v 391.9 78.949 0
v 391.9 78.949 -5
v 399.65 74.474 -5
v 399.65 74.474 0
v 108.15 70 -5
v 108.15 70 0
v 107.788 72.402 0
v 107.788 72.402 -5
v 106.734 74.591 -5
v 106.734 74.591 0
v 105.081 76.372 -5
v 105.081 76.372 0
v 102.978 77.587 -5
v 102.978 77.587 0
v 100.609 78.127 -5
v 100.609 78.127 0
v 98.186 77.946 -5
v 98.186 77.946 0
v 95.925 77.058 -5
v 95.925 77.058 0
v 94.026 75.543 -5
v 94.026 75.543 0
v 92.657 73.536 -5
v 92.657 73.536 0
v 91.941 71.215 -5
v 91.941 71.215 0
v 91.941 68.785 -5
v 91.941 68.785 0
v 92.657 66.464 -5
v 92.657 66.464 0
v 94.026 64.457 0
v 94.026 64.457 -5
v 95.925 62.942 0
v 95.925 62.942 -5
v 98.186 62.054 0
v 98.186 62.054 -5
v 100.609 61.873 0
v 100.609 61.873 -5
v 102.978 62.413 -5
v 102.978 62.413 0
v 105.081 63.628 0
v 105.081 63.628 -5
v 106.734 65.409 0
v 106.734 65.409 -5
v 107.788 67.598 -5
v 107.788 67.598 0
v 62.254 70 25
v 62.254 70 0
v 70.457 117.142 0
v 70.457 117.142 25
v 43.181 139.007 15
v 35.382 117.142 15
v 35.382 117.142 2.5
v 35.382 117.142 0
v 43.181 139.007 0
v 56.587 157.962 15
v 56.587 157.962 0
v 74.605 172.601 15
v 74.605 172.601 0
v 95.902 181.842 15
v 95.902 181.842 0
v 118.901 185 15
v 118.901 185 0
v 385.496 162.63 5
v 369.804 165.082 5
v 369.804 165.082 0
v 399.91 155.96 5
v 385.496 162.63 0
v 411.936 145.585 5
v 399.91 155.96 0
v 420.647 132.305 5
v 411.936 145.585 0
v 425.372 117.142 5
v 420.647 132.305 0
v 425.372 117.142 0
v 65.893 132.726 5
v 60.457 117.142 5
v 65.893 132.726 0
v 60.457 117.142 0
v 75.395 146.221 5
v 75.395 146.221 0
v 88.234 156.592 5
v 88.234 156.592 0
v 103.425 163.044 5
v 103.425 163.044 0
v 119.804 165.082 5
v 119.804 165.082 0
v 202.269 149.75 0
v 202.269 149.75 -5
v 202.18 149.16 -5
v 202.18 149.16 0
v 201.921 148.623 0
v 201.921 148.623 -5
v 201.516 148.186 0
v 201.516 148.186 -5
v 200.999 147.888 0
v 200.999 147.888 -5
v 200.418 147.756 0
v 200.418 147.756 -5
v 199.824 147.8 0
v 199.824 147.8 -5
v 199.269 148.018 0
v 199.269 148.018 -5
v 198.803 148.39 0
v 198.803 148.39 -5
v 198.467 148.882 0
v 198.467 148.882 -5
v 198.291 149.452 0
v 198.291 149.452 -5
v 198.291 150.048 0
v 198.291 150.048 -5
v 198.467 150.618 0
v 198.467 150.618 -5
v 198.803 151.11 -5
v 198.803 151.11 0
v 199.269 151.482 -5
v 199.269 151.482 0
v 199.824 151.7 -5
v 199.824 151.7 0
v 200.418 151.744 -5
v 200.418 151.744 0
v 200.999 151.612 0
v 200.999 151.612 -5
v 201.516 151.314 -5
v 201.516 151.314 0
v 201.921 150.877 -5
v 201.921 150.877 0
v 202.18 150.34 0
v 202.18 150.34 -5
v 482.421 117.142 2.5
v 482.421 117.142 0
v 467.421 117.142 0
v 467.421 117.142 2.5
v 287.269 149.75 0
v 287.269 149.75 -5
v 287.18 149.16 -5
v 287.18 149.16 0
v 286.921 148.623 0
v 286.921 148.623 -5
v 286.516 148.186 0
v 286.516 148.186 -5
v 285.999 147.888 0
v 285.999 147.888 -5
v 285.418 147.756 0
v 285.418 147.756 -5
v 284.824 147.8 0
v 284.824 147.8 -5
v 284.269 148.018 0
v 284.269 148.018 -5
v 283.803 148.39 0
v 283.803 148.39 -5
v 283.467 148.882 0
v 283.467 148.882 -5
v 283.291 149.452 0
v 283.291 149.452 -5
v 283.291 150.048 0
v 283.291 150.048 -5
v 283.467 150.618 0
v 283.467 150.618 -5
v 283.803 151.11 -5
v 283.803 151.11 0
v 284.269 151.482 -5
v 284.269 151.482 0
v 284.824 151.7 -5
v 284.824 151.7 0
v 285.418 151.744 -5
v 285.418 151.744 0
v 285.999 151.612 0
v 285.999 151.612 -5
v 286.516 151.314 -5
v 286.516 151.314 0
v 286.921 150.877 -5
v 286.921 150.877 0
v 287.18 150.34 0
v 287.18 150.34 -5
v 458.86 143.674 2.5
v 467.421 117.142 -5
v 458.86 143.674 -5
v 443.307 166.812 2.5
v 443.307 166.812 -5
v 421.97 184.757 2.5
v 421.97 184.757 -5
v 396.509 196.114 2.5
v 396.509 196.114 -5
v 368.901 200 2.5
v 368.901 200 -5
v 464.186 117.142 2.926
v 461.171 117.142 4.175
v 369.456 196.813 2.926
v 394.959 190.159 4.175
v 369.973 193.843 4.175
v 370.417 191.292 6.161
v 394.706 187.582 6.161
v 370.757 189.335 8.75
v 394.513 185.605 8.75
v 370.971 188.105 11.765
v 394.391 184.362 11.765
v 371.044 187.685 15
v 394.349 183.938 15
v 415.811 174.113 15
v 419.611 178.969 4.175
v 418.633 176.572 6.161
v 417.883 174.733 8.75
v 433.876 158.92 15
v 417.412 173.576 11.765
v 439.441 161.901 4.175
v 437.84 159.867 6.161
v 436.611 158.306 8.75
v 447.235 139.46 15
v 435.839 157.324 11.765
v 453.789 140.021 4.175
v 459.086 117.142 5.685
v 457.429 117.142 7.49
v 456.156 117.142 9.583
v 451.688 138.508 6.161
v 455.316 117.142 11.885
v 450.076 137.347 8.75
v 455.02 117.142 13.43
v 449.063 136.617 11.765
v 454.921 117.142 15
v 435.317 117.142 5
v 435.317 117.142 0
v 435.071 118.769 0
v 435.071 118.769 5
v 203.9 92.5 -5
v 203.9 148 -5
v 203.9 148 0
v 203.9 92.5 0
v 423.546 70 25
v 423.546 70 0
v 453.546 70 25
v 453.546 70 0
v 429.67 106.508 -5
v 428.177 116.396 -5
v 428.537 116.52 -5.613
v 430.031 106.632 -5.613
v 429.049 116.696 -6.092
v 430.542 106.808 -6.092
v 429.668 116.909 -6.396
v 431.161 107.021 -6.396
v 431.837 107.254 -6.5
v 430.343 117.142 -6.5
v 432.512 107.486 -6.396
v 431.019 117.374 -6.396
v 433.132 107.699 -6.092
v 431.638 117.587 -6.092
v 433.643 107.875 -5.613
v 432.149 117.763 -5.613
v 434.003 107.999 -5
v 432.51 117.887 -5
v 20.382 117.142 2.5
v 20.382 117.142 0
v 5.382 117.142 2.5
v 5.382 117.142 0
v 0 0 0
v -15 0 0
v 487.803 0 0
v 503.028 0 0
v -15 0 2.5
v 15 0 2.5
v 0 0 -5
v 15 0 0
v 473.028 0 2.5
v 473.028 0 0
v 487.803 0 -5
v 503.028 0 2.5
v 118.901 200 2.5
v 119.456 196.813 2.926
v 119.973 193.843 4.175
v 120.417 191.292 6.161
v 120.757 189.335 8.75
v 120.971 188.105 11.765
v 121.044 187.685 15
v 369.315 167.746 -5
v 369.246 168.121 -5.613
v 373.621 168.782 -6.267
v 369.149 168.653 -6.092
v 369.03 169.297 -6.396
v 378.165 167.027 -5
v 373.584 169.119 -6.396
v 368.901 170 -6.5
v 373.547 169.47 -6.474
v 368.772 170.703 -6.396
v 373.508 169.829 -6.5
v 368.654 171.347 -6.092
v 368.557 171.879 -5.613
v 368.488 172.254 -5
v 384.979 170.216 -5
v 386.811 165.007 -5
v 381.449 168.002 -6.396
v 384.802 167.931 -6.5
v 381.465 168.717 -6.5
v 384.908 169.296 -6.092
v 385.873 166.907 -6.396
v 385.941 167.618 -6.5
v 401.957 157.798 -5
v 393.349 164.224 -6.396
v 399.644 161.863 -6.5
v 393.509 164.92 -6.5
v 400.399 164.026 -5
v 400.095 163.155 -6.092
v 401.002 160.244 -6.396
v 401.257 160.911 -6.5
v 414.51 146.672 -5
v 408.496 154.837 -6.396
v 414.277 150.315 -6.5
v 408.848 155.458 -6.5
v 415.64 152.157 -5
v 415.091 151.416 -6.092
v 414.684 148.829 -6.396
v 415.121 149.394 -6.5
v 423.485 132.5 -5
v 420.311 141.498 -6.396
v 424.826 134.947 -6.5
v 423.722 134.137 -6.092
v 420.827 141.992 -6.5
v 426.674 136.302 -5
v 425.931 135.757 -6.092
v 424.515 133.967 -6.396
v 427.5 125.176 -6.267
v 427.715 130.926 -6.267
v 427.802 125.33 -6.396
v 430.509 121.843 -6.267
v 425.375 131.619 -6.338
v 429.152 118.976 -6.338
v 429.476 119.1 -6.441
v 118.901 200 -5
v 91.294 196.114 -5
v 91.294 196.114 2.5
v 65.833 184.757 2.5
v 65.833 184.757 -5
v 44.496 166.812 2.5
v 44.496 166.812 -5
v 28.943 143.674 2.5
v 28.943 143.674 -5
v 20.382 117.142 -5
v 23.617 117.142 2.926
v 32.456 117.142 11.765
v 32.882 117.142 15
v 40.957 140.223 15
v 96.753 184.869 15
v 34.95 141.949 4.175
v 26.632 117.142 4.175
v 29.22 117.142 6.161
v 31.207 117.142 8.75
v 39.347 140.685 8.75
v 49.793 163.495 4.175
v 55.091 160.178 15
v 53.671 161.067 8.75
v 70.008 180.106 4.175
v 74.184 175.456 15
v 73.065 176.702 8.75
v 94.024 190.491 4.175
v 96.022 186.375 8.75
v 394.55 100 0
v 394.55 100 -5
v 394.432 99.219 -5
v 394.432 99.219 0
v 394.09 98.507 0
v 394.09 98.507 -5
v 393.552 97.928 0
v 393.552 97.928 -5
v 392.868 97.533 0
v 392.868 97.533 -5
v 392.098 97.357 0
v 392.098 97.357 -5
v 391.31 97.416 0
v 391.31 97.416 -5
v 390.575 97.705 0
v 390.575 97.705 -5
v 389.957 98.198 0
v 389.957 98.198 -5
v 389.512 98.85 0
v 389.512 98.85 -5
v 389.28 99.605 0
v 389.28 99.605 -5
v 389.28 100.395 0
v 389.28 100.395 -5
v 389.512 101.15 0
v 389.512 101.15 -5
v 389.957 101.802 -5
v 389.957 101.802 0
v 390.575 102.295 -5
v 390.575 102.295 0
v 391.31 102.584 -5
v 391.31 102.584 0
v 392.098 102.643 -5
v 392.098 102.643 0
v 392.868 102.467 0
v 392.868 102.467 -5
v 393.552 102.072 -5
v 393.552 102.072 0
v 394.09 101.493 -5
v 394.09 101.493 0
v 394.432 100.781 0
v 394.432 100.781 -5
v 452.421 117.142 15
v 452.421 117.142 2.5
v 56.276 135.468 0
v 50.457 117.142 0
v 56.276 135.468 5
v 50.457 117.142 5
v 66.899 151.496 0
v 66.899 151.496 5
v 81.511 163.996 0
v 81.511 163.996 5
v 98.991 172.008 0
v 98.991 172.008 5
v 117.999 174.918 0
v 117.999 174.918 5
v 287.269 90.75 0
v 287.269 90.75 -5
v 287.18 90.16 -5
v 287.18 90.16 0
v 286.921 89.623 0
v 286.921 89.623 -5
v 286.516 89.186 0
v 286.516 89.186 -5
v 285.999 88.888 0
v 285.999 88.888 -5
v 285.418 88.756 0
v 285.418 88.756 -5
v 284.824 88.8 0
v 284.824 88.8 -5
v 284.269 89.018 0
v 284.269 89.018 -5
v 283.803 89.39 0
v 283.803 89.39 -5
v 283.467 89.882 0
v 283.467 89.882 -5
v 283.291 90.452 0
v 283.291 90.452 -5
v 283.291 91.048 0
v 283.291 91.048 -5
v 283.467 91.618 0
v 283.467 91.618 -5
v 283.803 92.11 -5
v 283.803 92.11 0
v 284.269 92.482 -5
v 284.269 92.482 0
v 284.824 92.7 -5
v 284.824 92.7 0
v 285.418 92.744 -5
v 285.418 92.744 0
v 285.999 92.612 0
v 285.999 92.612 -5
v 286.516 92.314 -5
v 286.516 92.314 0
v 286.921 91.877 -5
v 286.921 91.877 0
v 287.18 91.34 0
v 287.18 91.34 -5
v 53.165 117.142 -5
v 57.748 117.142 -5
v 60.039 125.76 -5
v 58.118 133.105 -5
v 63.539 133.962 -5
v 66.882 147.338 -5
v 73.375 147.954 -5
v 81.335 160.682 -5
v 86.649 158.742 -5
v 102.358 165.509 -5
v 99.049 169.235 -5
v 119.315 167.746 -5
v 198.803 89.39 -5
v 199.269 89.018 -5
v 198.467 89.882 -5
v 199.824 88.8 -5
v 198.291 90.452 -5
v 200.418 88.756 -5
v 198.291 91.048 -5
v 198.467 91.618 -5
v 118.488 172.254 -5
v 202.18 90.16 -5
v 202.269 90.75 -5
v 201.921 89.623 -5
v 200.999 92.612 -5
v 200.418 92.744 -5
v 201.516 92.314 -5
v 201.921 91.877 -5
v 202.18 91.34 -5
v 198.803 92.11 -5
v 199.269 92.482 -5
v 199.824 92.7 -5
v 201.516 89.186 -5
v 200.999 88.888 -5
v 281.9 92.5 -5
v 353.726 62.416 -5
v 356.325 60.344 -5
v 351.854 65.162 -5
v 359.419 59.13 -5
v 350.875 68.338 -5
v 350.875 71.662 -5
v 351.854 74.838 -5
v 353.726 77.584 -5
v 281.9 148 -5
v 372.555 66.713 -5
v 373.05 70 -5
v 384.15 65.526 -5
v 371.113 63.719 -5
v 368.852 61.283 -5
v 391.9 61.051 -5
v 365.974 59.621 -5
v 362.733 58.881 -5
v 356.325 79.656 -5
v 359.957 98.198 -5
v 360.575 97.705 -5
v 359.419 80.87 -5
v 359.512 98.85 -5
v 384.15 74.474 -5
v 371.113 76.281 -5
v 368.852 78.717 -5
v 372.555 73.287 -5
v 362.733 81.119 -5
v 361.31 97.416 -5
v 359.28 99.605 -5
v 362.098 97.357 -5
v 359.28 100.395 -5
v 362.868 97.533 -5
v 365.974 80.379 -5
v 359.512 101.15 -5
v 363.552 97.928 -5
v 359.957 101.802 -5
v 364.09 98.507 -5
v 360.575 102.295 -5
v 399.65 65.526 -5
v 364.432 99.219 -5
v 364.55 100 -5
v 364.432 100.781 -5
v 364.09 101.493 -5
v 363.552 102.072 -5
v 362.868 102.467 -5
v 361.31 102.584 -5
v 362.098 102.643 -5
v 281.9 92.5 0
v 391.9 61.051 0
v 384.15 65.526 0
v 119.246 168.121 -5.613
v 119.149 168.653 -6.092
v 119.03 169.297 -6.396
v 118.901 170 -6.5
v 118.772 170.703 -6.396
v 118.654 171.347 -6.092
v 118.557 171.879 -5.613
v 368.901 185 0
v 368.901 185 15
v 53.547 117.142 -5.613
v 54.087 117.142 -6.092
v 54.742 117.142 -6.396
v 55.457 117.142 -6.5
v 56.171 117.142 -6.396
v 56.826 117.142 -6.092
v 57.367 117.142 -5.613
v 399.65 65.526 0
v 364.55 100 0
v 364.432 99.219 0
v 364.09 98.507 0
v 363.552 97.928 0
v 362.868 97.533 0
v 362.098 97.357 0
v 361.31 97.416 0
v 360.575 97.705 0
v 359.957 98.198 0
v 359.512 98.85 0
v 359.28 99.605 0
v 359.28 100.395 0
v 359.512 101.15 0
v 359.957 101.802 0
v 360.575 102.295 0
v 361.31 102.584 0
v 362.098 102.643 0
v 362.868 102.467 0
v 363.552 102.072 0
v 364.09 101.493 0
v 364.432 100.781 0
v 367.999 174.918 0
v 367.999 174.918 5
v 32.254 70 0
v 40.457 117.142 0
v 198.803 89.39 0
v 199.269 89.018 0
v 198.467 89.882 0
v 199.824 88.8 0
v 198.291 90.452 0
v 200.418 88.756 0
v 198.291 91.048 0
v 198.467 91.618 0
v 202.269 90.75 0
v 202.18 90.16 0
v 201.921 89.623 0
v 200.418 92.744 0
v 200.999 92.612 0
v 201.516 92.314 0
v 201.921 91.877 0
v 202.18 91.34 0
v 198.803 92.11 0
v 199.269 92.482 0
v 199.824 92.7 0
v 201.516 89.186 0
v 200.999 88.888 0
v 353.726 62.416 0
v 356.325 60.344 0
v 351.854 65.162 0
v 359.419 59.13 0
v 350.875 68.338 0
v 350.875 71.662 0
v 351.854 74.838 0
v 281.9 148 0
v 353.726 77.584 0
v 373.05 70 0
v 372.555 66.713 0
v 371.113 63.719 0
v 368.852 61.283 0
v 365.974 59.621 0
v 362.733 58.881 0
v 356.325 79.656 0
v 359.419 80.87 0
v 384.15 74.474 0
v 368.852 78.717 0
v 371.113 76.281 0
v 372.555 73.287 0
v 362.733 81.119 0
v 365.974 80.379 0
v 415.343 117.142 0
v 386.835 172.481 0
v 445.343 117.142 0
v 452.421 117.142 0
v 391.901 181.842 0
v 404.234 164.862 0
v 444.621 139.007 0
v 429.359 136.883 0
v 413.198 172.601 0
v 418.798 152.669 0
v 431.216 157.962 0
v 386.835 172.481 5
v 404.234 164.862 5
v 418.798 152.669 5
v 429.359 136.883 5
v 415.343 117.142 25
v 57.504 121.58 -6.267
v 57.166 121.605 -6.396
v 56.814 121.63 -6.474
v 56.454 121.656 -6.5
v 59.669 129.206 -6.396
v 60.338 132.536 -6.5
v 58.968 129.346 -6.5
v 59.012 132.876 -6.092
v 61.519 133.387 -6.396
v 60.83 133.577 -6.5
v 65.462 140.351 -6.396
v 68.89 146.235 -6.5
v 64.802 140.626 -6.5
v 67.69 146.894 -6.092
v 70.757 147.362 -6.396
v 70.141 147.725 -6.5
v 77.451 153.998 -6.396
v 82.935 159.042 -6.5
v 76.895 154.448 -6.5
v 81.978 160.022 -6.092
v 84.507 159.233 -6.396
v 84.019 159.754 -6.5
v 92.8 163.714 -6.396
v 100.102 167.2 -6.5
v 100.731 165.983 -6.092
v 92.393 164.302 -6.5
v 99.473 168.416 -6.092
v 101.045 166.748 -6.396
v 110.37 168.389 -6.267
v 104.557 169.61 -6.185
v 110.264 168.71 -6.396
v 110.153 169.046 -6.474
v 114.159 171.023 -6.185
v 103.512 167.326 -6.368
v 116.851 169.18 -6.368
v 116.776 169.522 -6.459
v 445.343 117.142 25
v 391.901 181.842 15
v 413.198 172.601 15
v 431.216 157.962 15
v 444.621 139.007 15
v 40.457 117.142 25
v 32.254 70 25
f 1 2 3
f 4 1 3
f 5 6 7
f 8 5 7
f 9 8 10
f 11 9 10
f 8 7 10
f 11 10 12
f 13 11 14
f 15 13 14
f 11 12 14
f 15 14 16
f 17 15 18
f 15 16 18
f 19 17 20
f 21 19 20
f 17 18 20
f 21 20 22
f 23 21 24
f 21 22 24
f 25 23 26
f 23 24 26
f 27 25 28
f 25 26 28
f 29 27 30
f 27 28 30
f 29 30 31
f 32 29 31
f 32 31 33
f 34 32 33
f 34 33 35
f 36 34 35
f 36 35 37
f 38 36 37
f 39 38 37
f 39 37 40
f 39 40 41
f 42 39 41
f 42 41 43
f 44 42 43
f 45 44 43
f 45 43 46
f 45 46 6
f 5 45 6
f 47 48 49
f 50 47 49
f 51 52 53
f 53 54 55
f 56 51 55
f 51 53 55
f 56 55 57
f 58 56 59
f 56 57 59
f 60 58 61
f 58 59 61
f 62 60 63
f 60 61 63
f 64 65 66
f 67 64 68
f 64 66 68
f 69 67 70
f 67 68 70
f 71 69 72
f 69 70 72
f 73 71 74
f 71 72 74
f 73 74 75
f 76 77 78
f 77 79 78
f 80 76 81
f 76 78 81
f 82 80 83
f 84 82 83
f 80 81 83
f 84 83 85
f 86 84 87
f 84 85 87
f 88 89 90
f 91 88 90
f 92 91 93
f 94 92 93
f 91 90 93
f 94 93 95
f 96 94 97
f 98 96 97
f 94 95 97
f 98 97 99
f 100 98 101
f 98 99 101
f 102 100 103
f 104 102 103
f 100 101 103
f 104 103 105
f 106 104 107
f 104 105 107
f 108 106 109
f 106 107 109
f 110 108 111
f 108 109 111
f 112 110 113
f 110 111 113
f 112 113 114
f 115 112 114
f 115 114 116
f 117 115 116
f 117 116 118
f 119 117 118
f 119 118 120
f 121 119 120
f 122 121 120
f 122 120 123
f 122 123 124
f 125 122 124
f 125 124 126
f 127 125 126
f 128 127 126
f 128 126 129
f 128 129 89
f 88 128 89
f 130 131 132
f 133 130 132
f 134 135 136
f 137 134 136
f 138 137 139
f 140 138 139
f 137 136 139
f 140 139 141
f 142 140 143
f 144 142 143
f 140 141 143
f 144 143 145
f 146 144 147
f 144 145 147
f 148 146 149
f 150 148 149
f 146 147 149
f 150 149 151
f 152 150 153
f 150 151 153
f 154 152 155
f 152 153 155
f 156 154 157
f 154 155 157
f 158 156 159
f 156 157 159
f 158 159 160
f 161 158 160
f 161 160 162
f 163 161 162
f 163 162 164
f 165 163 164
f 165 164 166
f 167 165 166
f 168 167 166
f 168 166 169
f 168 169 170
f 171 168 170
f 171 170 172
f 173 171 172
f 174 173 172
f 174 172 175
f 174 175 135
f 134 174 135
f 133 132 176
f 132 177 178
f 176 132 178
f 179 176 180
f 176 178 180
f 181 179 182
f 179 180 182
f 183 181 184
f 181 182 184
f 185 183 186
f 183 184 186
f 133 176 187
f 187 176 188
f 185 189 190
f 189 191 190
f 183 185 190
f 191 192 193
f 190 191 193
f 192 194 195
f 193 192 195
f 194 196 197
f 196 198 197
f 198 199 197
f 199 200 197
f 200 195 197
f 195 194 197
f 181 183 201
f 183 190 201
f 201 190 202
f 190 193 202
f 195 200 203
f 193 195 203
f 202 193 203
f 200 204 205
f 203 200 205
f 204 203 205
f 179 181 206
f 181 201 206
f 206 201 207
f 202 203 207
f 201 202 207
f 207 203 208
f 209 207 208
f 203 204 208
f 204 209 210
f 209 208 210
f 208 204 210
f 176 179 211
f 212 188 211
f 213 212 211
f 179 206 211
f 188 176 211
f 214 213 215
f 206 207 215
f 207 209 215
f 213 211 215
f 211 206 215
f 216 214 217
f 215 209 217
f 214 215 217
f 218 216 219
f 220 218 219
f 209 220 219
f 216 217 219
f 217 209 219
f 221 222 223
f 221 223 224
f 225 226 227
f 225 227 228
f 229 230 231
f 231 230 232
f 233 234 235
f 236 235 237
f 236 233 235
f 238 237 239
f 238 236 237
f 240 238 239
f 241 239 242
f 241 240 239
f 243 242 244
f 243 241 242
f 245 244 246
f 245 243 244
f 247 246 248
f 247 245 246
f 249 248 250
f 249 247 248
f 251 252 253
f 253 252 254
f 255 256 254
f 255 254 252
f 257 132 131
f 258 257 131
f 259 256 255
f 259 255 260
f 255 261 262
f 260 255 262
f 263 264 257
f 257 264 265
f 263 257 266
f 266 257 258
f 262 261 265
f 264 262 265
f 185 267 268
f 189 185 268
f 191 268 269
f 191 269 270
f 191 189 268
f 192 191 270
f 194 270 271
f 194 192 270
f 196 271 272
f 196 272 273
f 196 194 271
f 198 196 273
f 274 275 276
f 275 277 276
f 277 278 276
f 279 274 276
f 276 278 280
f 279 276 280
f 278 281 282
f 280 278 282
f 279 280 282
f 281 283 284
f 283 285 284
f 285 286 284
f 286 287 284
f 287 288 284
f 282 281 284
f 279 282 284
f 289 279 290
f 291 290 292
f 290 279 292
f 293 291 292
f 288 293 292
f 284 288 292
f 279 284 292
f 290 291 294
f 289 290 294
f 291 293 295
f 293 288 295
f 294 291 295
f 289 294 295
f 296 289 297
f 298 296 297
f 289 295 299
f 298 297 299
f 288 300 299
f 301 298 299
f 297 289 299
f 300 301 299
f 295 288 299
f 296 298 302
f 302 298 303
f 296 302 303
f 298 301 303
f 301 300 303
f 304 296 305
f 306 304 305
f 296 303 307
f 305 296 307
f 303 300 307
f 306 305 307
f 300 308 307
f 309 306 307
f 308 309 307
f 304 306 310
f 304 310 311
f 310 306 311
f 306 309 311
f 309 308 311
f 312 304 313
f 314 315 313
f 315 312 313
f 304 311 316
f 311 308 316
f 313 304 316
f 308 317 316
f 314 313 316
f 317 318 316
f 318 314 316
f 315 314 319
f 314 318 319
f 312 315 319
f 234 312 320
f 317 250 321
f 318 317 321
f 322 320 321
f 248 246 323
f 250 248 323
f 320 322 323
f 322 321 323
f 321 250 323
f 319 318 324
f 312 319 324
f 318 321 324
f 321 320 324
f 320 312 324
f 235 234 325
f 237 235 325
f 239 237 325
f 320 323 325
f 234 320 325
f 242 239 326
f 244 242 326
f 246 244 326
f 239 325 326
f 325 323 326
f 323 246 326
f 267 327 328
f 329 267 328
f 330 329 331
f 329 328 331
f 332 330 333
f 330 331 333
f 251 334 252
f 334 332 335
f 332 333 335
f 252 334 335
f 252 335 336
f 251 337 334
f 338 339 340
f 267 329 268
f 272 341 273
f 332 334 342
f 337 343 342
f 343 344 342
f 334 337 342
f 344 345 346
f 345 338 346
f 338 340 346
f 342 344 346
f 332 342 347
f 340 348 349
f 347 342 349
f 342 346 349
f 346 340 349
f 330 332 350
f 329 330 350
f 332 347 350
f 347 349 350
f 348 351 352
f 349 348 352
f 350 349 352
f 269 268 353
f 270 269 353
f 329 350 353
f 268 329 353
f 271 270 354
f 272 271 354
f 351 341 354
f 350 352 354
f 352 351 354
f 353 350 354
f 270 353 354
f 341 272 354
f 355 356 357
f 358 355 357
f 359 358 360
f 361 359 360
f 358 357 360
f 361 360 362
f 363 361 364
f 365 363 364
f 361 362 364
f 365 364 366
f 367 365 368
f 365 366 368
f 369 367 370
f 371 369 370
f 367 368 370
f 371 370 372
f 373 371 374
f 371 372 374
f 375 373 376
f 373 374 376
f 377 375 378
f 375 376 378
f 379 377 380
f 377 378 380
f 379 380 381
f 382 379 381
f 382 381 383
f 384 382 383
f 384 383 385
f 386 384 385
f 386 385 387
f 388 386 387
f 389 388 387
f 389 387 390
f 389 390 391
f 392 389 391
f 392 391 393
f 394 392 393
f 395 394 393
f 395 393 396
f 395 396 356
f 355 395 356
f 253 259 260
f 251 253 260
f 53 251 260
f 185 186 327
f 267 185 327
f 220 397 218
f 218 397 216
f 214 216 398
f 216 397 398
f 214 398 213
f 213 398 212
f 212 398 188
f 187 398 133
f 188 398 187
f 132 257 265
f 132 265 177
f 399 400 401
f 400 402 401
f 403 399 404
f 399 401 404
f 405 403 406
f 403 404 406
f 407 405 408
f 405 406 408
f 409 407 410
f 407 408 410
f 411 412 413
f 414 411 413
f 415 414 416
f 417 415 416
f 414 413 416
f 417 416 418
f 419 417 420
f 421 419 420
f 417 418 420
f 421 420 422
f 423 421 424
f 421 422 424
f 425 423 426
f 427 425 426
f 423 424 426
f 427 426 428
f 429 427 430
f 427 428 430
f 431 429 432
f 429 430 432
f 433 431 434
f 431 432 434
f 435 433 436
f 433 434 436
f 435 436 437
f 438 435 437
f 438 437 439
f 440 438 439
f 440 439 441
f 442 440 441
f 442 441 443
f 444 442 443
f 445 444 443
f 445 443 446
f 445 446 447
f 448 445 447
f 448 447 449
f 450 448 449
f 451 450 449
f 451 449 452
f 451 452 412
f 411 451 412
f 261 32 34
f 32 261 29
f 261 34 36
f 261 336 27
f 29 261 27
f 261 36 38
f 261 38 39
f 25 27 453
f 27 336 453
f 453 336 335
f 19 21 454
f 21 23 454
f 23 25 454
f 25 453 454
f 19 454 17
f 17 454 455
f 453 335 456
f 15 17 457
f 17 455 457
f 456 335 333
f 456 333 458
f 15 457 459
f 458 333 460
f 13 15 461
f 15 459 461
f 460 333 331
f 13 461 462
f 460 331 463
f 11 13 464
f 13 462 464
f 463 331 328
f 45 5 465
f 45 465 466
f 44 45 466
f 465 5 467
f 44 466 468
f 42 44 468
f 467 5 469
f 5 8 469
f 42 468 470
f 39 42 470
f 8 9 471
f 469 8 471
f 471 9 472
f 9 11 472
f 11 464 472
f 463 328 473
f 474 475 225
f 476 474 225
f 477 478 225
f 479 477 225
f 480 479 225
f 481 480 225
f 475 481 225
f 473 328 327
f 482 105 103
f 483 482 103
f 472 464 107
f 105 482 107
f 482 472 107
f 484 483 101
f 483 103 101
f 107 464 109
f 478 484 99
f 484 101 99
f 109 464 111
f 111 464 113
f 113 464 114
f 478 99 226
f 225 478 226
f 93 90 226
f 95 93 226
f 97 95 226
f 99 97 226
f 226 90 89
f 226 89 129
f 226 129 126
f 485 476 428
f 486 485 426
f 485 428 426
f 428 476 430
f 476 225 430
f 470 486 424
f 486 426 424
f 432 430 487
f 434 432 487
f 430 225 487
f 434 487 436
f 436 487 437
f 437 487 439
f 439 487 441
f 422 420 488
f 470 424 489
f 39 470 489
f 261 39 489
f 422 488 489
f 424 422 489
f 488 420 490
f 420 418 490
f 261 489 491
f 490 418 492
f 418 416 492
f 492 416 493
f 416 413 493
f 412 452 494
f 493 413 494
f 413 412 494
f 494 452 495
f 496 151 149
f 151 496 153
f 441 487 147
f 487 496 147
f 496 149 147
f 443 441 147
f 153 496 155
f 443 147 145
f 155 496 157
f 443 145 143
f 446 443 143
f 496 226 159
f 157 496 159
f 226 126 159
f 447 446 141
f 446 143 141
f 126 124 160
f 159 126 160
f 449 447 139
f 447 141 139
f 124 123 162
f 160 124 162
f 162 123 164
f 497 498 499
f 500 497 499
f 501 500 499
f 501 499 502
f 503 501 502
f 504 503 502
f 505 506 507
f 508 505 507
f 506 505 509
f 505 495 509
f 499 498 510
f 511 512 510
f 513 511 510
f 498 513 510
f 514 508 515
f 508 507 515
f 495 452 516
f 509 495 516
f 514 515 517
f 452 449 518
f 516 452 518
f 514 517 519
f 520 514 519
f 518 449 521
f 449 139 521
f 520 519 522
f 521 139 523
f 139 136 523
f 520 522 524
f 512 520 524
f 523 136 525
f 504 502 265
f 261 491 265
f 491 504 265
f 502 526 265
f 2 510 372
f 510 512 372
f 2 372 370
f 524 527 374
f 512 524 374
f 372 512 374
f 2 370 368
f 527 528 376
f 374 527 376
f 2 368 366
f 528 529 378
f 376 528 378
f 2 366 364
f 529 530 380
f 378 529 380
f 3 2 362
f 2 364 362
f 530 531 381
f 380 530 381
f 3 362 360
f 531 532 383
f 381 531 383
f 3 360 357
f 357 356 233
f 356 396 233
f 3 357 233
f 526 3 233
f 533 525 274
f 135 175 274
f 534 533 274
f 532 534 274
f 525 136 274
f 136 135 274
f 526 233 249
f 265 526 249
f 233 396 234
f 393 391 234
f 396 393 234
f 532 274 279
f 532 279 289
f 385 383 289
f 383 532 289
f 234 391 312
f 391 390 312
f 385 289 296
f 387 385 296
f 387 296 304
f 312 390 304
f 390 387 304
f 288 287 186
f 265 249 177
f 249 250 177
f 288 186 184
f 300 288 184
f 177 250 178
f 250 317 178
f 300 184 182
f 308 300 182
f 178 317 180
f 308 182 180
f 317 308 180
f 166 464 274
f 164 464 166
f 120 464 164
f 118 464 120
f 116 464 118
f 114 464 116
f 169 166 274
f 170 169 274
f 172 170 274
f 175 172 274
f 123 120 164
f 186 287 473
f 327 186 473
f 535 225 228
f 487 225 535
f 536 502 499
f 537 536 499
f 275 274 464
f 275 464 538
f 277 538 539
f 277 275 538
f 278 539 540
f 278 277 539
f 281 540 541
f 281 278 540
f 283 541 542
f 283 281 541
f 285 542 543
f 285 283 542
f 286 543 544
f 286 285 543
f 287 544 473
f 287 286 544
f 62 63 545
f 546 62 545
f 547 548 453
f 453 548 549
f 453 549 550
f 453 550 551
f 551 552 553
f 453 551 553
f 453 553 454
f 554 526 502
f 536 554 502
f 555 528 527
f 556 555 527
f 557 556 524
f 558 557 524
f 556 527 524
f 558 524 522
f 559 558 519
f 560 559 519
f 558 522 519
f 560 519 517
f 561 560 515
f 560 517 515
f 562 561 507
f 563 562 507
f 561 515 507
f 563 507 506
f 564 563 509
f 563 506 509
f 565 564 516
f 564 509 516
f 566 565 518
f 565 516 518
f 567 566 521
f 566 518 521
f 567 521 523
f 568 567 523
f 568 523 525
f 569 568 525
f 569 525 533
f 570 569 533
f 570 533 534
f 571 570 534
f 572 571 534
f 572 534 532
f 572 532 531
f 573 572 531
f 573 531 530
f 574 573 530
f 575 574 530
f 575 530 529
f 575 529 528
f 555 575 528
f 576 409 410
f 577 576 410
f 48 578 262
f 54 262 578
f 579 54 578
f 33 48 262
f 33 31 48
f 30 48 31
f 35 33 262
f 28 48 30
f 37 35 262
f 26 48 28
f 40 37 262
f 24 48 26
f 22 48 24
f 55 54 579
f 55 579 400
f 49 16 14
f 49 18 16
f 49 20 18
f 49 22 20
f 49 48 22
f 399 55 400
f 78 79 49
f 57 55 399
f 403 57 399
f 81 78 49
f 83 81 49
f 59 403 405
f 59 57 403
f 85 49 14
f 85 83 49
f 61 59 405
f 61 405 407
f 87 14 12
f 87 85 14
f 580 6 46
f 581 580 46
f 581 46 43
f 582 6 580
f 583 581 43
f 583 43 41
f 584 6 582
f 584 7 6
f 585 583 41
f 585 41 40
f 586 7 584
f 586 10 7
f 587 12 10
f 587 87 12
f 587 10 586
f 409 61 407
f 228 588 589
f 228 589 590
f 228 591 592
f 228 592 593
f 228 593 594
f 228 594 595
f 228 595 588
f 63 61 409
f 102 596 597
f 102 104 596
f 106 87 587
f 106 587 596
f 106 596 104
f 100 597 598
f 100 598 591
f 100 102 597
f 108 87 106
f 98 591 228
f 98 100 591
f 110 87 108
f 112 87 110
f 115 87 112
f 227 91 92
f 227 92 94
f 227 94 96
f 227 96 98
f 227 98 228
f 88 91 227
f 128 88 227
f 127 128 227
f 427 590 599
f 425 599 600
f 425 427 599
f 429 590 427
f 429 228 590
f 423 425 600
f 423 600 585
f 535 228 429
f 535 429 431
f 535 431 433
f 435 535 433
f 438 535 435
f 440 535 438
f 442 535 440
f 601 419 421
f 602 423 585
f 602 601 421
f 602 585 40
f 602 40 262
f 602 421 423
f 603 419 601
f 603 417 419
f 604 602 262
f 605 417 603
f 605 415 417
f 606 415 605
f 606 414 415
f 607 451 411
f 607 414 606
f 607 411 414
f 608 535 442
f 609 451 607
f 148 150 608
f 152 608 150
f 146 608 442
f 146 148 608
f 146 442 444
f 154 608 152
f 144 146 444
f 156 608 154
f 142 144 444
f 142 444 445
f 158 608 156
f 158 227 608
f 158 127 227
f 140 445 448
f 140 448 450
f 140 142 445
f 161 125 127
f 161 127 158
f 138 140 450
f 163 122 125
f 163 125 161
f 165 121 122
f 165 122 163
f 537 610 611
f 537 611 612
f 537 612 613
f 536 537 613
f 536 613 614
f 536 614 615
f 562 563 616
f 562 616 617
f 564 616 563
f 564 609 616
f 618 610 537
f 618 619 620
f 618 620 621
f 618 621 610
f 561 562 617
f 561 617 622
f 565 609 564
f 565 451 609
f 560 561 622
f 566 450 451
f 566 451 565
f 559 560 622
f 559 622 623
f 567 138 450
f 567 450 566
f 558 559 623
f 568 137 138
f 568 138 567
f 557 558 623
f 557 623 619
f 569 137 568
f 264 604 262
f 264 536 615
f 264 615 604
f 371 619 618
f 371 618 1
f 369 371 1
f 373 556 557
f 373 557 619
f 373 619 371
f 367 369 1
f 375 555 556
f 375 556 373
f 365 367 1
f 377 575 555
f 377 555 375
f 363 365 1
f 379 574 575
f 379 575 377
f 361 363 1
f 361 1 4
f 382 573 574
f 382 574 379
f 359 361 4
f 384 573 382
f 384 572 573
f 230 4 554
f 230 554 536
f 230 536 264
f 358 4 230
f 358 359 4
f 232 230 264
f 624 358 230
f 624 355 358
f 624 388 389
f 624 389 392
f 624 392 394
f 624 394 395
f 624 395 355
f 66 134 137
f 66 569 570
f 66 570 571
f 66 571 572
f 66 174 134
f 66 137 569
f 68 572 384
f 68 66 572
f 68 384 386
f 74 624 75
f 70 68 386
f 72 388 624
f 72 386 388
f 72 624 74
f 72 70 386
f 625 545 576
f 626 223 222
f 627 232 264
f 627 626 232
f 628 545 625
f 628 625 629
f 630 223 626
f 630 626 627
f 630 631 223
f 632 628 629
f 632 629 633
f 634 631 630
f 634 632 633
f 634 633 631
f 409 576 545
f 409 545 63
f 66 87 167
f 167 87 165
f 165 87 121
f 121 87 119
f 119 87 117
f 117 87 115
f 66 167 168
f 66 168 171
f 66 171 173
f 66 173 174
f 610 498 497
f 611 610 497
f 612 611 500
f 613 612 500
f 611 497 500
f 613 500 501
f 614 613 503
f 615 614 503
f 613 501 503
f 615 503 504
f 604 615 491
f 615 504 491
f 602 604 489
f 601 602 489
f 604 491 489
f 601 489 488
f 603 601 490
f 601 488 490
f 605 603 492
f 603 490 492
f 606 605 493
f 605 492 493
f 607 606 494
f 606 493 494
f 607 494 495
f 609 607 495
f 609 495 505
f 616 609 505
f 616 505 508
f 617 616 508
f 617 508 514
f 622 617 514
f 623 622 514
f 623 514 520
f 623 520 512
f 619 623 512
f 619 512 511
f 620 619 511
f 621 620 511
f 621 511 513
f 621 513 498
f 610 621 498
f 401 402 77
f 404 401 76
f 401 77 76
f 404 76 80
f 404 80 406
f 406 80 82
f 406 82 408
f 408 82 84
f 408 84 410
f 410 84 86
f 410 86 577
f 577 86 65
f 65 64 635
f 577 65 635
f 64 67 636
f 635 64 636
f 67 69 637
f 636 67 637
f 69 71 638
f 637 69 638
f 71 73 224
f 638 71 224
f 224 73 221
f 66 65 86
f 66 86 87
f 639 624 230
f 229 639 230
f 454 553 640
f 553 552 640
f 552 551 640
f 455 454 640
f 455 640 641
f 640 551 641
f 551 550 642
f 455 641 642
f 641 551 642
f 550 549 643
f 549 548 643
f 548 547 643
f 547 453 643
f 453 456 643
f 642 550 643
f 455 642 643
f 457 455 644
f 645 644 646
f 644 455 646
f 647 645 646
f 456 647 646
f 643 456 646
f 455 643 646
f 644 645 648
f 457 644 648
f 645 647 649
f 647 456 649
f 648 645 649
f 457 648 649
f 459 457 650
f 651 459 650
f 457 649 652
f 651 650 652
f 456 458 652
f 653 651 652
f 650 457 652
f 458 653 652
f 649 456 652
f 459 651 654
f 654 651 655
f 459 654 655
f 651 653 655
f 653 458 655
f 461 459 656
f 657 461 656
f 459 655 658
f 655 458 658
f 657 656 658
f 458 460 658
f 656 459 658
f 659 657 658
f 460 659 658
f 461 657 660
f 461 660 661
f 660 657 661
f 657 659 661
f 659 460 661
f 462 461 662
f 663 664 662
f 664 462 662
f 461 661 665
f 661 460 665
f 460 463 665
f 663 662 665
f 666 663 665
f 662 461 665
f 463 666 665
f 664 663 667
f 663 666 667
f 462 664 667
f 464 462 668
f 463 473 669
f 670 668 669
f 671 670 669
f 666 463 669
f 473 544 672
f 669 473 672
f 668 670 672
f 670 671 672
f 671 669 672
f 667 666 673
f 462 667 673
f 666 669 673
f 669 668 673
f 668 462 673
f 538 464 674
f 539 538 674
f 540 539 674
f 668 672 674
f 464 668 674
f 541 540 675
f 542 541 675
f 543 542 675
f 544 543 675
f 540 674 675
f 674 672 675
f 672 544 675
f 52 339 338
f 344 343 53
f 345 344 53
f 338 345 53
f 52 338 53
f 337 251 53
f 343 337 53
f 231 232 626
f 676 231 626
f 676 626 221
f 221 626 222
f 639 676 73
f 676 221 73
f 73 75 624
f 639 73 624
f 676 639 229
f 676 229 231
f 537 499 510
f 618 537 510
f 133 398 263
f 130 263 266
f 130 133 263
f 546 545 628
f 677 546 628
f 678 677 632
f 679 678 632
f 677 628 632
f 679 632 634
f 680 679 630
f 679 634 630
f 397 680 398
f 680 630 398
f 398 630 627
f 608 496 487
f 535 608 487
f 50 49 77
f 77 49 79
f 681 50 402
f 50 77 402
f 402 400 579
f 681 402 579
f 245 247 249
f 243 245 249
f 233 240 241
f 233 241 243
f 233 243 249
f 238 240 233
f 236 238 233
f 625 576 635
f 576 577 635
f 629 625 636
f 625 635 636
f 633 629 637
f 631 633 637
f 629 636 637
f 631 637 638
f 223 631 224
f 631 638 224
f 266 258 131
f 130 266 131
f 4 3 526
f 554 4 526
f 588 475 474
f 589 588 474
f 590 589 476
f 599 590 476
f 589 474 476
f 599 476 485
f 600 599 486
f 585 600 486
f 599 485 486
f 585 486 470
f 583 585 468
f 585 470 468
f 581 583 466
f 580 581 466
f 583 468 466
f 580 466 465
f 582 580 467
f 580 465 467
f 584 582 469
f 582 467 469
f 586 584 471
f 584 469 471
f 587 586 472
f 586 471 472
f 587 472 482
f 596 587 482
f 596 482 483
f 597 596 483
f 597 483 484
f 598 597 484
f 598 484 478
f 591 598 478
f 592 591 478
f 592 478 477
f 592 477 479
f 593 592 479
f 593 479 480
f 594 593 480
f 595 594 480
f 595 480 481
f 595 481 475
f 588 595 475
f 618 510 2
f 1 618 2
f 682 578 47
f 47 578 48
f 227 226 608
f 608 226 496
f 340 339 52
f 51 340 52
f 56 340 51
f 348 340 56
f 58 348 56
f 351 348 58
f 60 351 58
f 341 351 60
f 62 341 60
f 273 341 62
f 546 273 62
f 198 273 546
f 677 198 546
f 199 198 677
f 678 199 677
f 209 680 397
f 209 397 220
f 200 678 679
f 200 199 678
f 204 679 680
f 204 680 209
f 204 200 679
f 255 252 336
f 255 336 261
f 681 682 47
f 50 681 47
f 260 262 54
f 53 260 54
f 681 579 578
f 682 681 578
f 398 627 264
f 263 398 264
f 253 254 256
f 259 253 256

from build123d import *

# Parameters (mm, degrees)
F1_DEPTH  = 5
F3_DEPTH  = 15
F8_DEPTH  = 2.5
F9_W      = 78
F9_H      = 55.5
F9_R      = 2
F10_DEPTH = 25
F11_R     = 11.15
F11_R_2   = 2.65
F12_DEPTH = 25
F13_R     = 8.15
F14_DEPTH = 25
F16_DEPTH = 25
F17_W     = 10
F17_H     = 5
F17_R     = 2.5


with BuildPart() as f1:
    # F0 (on Top) → F1 (new body)
    with BuildSketch(Plane.XY):
        with BuildLine():
            Line((20.3815252042, 117.1415335559), (0, 0))
            Line((0, 0), (487.8028212909, 0))
            Line((487.8028212909, 0), (467.4212960867, 117.1415335559))
            ThreePointArc((467.4212960867, 117.1415335559), (433.2669551721, 176.5315404118), (368.9014106455, 200))
            Line((368.9014106455, 200), (118.9014106455, 200))
            ThreePointArc((118.9014106455, 200), (54.5358661189, 176.5315404118), (20.3815252042, 117.1415335559))
        make_face()
    extrude(amount=-F1_DEPTH)

    # F2 (on face) → F3 (join)
    with BuildSketch(Plane.XY):
        with BuildLine():
            Line((368.9014106455, 200), (118.9014106455, 200))
            ThreePointArc((118.9014106455, 200), (54.5358661189, 176.5315404118), (20.3815252042, 117.1415335559))
            Line((20.3815252042, 117.1415335559), (35.3815252042, 117.1415335559))
            ThreePointArc((35.3815252042, 117.1415335559), (65.0954102081, 165.8969986874), (118.9014106455, 185))
            Line((118.9014106455, 185), (368.9014106455, 185))
            ThreePointArc((368.9014106455, 185), (422.7074110828, 165.8969986874), (452.4212960867, 117.1415335559))
            Line((452.4212960867, 117.1415335559), (467.4212960867, 117.1415335559))
            ThreePointArc((467.4212960867, 117.1415335559), (433.2669551721, 176.5315404118), (368.9014106455, 200))
        make_face()
    extrude(amount=F3_DEPTH)

    # F6: sweep along a path in F5
    with BuildLine(Plane.XY.offset(15)) as f6_path:
        ThreePointArc((20.3815252042, 117.1415335559), (54.5358661189, 176.5315404118), (118.9014106455, 200))
        Line((118.9014106455, 200), (368.9014106455, 200))
        ThreePointArc((368.9014106455, 200), (433.2669551721, 176.5315404118), (467.4212960867, 117.1415335559))
    # F4 (on face) → F6 (sweep, cut)
    with BuildSketch(Plane.XZ.offset(-117.1415335559)):
        with BuildLine():
            ThreePointArc((20.3815252042, 2.5), (29.2203599691, 6.1611652352), (32.8815252042, 15))
            Line((32.8815252042, 15), (20.3815252042, 15))
            Line((20.3815252042, 15), (20.3815252042, 2.5))
        make_face()
    sweep(path=f6_path.line, mode=Mode.SUBTRACT)

    # F7 (on face) → F8 (join)
    with BuildSketch(Plane.XY):
        Polygon((-15, 0), (0, 0), (20.3815252042, 117.1415335559), (5.3815252042, 117.1415335559), align=None)
        Polygon((0, 0), (15, 0), (35.3815252042, 117.1415335559), (20.3815252042, 117.1415335559), align=None)
        Polygon((452.4212960867, 117.1415335559), (473.0281739523, 0), (487.8028212909, 0), (467.4212960867, 117.1415335559), align=None)
        Polygon((467.4212960867, 117.1415335559), (487.8028212909, 0), (503.0281739523, 0), (482.4212960867, 117.1415335559), align=None)
    extrude(amount=F8_DEPTH)

    # F9 (on face) → F10 (cut)
    with BuildSketch(Plane(origin=(0, 0, -5), x_dir=(1, 0, 0), z_dir=(0, 0, -1))):
        with Locations((242.9, -120.25)):
            Rectangle(F9_W, F9_H)
        with Locations((200.2686832967, -149.75)):
            Circle(F9_R)
        with Locations((200.2686832967, -90.75)):
            Circle(F9_R)
        with Locations((285.2686832967, -90.75)):
            Circle(F9_R)
        with Locations((285.2686832967, -149.75)):
            Circle(F9_R)
    extrude(amount=-F10_DEPTH, mode=Mode.SUBTRACT)

    # F11 (on face) → F12 (cut)
    with BuildSketch(Plane(origin=(0, 0, -5), x_dir=(1, 0, 0), z_dir=(0, 0, -1))):
        Polygon((391.9, -78.9489291724), (399.65, -74.4744645862), (399.65, -65.5255354138), (391.9, -61.0510708276), (384.15, -65.5255354138), (384.15, -74.4744645862), align=None)
        with Locations((361.9, -70)):
            Circle(F11_R)
        with Locations((361.9, -100)):
            Circle(F11_R_2)
        with Locations((391.9, -100)):
            Circle(F11_R_2)
    extrude(amount=-F12_DEPTH, mode=Mode.SUBTRACT)

    # F13 (on face) → F14 (cut)
    with BuildSketch(Plane.XY):
        with Locations((100, 70)):
            Circle(F13_R)
    extrude(amount=-F14_DEPTH, mode=Mode.SUBTRACT)

    # F15 (on face) → F16 (join)
    with BuildSketch(Plane.XY):
        Polygon((40.456642758, 117.1415335559), (32.2544592526, 70), (62.2544592526, 70), (70.456642758, 117.1415335559), align=None)
        Polygon((415.343357242, 117.1415335559), (423.5455407474, 70), (453.5455407474, 70), (445.343357242, 117.1415335559), align=None)
    extrude(amount=F16_DEPTH)

    # F19: sweep along a path in F18
    with BuildLine(Plane.XY) as f19_path:
        ThreePointArc((55.456642758, 117.1415335559), (77.6120171917, 155.0538221629), (118.9014106455, 170))
        Line((118.9014106455, 170), (368.9014106455, 170))
        ThreePointArc((368.9014106455, 170), (409.4264963221, 154.9669307173), (430.343357242, 117.1415335559))
        Line((430.343357242, 117.1415335559), (431.8368507266, 107.2536886334))
    # F17 (on face) → F19 (sweep)
    with BuildSketch(Plane(origin=(0, 117.1415335559, 0), x_dir=(-1, 0, 0), z_dir=(0, 1, 0))):
        with Locations((-55.456642758, 2.5)):
            Rectangle(F17_W, F17_H)
        with Locations((-55.456642758, -4)):
            Circle(F17_R)
    sweep(path=f19_path.line)


solid = f1.part
